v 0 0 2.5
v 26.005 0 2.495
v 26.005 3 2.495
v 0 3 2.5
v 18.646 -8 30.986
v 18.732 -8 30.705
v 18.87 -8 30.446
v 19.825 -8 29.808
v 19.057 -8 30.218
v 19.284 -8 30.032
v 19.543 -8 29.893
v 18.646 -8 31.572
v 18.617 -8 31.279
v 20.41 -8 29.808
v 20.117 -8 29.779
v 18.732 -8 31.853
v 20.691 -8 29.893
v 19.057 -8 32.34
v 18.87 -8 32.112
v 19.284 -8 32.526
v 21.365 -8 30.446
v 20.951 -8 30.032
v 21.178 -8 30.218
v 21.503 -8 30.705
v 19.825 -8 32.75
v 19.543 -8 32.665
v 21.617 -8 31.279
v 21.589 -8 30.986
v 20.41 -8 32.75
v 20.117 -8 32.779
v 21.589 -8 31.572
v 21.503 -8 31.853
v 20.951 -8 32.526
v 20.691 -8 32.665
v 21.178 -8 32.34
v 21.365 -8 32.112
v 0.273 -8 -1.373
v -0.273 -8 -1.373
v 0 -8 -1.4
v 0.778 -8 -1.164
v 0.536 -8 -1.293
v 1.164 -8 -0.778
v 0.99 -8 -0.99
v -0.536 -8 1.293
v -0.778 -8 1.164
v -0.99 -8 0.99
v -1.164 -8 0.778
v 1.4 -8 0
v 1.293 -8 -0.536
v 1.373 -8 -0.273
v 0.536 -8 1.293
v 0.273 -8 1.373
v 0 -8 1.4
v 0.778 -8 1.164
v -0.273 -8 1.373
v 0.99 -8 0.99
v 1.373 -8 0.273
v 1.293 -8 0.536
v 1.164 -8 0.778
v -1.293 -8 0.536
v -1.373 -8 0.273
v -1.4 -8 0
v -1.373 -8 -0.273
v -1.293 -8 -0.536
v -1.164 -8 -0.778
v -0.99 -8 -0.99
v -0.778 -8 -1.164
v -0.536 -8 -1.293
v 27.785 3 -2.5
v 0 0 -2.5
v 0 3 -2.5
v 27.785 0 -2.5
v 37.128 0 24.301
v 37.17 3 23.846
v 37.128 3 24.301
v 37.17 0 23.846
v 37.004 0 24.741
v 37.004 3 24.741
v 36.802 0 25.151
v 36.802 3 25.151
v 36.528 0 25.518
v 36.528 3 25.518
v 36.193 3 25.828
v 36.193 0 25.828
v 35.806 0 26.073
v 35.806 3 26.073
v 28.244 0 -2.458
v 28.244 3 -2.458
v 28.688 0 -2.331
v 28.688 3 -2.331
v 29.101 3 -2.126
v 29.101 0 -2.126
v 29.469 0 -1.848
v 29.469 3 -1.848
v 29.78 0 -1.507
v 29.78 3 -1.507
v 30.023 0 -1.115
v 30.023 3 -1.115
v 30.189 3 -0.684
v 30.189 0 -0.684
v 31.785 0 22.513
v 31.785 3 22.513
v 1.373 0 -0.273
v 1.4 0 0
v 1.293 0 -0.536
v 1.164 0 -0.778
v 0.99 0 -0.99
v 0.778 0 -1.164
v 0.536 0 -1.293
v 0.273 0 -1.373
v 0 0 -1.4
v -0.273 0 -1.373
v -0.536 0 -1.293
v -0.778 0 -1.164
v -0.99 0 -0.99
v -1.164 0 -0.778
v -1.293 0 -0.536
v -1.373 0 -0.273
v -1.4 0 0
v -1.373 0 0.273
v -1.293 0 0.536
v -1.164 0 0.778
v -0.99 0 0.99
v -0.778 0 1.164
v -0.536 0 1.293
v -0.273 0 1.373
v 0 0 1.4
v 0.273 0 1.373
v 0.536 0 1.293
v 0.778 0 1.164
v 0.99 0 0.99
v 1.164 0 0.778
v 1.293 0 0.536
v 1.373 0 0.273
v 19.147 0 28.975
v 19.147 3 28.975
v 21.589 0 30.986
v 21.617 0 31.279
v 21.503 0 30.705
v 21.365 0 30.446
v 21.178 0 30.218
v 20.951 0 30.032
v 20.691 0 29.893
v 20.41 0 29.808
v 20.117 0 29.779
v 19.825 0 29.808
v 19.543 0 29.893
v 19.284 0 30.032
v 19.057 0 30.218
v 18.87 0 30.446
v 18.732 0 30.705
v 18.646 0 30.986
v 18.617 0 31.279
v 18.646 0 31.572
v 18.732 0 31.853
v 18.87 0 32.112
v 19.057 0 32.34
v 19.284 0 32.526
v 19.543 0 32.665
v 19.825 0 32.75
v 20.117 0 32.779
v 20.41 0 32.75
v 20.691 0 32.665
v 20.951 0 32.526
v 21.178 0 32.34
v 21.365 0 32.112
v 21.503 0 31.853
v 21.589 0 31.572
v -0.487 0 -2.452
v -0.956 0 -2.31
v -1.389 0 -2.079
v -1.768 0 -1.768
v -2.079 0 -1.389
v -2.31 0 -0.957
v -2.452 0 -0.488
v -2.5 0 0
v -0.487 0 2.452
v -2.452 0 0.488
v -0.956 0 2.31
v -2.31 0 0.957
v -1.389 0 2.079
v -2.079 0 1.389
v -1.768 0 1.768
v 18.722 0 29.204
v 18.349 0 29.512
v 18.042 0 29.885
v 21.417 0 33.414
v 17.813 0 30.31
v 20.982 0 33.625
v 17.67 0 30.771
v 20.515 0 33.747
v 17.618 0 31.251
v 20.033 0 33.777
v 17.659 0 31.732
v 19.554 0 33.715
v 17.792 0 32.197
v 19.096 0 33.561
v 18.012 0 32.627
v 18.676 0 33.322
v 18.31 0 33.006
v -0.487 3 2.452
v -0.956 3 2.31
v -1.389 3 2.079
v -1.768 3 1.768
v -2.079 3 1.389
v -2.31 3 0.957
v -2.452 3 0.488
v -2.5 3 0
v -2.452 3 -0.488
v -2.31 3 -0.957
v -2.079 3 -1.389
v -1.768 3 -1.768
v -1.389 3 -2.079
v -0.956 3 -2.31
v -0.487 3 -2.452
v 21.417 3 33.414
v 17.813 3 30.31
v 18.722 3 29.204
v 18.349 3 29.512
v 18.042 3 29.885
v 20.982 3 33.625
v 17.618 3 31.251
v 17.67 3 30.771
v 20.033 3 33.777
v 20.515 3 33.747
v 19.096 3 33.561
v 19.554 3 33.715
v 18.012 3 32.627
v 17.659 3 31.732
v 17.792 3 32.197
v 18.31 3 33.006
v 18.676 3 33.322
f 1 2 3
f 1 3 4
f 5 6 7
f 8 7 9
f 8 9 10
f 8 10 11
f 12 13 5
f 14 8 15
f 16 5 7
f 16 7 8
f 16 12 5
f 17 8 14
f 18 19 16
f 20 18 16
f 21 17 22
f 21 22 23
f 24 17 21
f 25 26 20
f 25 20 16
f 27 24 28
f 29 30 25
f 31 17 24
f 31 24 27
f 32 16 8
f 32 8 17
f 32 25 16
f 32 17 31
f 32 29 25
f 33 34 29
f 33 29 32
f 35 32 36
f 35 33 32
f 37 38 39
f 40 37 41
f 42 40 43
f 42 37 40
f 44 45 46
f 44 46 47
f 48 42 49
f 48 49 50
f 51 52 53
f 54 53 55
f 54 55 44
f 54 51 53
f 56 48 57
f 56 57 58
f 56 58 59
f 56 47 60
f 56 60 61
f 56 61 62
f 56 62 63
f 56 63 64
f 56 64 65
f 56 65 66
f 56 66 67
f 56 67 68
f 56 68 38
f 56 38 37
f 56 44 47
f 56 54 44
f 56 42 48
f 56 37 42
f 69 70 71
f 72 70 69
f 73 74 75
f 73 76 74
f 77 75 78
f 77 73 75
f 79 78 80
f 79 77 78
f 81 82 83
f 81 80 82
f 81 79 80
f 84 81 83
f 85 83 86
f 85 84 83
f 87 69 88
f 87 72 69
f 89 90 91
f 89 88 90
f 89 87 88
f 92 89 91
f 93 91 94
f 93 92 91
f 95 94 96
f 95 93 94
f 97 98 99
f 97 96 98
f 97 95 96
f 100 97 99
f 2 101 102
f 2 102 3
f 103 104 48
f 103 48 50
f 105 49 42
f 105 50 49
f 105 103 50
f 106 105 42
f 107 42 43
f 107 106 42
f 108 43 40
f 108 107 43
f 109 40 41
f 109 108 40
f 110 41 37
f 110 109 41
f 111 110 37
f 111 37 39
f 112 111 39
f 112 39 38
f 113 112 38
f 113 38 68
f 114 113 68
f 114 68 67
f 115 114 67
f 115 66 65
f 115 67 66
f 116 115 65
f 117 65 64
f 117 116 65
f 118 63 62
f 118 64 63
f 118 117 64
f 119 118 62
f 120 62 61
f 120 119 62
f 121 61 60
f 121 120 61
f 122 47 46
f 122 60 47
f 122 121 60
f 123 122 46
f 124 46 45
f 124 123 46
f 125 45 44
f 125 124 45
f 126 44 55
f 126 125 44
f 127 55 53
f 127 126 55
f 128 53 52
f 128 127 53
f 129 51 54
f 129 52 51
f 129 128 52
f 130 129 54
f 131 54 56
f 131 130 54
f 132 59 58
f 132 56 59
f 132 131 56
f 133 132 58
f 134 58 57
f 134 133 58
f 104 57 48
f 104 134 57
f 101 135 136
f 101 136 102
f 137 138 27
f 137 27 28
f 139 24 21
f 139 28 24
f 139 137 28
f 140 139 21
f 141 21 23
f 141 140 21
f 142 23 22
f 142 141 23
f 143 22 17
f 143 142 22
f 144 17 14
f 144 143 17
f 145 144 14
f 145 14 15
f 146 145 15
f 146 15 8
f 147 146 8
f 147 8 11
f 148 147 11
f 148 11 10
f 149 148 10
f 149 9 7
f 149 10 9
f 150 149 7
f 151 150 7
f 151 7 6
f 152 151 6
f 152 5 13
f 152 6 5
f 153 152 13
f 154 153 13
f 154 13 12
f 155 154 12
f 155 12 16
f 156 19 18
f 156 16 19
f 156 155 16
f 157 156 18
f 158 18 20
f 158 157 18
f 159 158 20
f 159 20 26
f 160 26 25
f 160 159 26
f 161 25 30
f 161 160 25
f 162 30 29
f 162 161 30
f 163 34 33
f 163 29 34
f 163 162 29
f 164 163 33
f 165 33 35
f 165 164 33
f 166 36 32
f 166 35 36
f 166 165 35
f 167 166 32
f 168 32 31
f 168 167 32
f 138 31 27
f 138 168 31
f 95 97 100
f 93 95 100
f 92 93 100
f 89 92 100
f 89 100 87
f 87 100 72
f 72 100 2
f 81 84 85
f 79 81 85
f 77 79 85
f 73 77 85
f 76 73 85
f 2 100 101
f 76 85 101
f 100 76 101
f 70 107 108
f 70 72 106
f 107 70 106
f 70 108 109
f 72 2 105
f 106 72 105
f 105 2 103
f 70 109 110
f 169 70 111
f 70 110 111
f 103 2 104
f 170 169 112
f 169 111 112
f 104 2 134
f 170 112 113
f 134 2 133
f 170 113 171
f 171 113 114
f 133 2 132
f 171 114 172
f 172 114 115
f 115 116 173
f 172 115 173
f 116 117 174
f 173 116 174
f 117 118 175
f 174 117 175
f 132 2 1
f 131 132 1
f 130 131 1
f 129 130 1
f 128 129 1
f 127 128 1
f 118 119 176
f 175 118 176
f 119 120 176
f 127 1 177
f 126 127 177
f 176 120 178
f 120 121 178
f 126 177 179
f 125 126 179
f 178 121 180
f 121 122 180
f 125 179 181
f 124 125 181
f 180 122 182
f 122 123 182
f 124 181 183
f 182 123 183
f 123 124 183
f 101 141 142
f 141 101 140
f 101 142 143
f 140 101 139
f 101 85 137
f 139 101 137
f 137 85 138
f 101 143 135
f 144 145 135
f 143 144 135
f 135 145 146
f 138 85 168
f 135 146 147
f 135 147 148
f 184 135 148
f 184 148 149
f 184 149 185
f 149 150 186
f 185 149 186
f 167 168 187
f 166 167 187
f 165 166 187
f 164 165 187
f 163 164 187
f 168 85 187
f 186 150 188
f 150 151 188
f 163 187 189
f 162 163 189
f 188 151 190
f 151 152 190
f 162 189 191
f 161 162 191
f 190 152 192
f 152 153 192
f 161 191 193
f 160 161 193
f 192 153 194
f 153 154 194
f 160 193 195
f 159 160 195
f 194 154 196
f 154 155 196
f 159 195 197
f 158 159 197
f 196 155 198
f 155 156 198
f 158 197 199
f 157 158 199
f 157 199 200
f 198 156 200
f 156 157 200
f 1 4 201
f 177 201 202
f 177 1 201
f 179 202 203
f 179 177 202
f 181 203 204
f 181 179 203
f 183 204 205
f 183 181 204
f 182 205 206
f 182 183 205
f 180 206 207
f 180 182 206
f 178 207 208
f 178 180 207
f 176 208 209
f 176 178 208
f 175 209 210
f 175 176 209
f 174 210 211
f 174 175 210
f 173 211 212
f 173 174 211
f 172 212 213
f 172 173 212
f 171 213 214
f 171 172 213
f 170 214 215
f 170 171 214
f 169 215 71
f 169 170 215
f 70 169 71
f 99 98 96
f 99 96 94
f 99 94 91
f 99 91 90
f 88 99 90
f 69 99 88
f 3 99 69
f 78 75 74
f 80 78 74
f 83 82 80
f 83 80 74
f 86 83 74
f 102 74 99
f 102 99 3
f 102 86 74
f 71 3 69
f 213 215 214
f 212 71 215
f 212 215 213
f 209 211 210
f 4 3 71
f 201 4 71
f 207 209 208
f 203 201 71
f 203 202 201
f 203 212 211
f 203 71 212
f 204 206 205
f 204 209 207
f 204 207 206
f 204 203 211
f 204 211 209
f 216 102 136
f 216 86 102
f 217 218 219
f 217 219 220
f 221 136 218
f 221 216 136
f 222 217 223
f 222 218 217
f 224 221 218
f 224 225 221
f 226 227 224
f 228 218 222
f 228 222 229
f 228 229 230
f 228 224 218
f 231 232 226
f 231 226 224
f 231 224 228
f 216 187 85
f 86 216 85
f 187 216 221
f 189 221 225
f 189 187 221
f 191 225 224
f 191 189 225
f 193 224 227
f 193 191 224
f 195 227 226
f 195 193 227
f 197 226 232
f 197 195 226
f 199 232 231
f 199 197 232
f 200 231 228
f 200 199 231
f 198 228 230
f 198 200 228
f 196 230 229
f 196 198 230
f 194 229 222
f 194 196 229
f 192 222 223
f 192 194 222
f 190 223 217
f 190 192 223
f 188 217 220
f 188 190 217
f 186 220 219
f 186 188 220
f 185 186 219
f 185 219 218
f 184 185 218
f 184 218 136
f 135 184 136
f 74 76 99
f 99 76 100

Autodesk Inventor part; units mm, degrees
ref_plane "YZ Plane" through (0, 0, 0) normal (1, 0, 0) x (0, 1, 0)
ref_plane "XZ Plane" through (0, 0, 0) normal (0, 1, 0) x (-1, 0, 0)
ref_plane "XY Plane" through (0, 0, 0) normal (0, 0, 1) x (1, 0, 0)
sketch "Sketch1" plane through (0, 0, 0) normal (0, 1, 0) x (-1, 0, 0)
  circle A0 centre (0, 0) radius 2.5
  circle A1 centre (-27.7848, -0.0003) radius 2.5
  circle A2 centre (-34.6699, 23.8458) radius 2.5
  circle A3 centre (-20.1174, 31.2789) radius 2.5
  line L0 (-32.1699, 23.8458) -> (-25.2848, -0.0003)
  line L1 (-37.1699, 23.8458) -> (-30.1893, -0.6845)
  line L2 (-27.9447, 2.4946) -> (-0.0005, 2.5)
  line L3 (-0.0005, -2.5) -> (-27.7848, -2.5003)
  line L4 (-19.1471, 28.9749) -> (-33.5318, 21.6199)
  arc A4 (-33.5318, 21.6199) -> (-35.8061, 26.0727) centre (-34.6699, 23.8458) ccw
  line L5 (-21.4171, 33.4145) -> (-35.8061, 26.0727)
  dimension "d0" = 5
  dimension "d1" = 5
  dimension "d2" = 5
  dimension "d3" = 5
extrude "Extrusion1" add sketch "Sketch1" along normal blind 3 contours A0 | A0 L3 A1 L0 L2 | L0 A1 L1 A2 L4 | A1 L0 | L4 A2 L0 | L0 A2 L5 A3 L4 | A1 L0 | A2 L1 | A3 picked at (-35.4421, 23.1763)
sketch "Sketch2" plane through (0, 0, 0) normal (0, -1, 0) x (1, 0, 0)
  circle A0 centre (0, 0) radius 1.4
  dimension "d6" = 2.8
extrude "Extrusion2" add sketch "Sketch2" along normal blind 8
thread "Thread3" size "M3x0.5" class "6g" standard "ANSI Metric M Profile" full length
sketch "Sketch3" plane through (0, 3, 0) normal (0, 1, 0) x (1, 0, 0)
  point P0 (0, 0)
sketch "Sketch4" plane through (0, 0, 0) normal (0, -1, 0) x (1, 0, 0)
  arc A0 (21.4171, 33.4145) -> (19.1471, 28.9749) centre (20.1174, 31.2789) ccw projected
  circle A1 centre (20.1174, 31.2789) radius 1.5
  point P0 (0, 0)
  dimension "d15" = 3
extrude "Extrusion3" add sketch "Sketch4" along normal blind 8
thread "Thread4" size "M3x0.5" class "6g" standard "ANSI Metric M Profile" full length
properties part number "Servo_Arm_Hook_new"
